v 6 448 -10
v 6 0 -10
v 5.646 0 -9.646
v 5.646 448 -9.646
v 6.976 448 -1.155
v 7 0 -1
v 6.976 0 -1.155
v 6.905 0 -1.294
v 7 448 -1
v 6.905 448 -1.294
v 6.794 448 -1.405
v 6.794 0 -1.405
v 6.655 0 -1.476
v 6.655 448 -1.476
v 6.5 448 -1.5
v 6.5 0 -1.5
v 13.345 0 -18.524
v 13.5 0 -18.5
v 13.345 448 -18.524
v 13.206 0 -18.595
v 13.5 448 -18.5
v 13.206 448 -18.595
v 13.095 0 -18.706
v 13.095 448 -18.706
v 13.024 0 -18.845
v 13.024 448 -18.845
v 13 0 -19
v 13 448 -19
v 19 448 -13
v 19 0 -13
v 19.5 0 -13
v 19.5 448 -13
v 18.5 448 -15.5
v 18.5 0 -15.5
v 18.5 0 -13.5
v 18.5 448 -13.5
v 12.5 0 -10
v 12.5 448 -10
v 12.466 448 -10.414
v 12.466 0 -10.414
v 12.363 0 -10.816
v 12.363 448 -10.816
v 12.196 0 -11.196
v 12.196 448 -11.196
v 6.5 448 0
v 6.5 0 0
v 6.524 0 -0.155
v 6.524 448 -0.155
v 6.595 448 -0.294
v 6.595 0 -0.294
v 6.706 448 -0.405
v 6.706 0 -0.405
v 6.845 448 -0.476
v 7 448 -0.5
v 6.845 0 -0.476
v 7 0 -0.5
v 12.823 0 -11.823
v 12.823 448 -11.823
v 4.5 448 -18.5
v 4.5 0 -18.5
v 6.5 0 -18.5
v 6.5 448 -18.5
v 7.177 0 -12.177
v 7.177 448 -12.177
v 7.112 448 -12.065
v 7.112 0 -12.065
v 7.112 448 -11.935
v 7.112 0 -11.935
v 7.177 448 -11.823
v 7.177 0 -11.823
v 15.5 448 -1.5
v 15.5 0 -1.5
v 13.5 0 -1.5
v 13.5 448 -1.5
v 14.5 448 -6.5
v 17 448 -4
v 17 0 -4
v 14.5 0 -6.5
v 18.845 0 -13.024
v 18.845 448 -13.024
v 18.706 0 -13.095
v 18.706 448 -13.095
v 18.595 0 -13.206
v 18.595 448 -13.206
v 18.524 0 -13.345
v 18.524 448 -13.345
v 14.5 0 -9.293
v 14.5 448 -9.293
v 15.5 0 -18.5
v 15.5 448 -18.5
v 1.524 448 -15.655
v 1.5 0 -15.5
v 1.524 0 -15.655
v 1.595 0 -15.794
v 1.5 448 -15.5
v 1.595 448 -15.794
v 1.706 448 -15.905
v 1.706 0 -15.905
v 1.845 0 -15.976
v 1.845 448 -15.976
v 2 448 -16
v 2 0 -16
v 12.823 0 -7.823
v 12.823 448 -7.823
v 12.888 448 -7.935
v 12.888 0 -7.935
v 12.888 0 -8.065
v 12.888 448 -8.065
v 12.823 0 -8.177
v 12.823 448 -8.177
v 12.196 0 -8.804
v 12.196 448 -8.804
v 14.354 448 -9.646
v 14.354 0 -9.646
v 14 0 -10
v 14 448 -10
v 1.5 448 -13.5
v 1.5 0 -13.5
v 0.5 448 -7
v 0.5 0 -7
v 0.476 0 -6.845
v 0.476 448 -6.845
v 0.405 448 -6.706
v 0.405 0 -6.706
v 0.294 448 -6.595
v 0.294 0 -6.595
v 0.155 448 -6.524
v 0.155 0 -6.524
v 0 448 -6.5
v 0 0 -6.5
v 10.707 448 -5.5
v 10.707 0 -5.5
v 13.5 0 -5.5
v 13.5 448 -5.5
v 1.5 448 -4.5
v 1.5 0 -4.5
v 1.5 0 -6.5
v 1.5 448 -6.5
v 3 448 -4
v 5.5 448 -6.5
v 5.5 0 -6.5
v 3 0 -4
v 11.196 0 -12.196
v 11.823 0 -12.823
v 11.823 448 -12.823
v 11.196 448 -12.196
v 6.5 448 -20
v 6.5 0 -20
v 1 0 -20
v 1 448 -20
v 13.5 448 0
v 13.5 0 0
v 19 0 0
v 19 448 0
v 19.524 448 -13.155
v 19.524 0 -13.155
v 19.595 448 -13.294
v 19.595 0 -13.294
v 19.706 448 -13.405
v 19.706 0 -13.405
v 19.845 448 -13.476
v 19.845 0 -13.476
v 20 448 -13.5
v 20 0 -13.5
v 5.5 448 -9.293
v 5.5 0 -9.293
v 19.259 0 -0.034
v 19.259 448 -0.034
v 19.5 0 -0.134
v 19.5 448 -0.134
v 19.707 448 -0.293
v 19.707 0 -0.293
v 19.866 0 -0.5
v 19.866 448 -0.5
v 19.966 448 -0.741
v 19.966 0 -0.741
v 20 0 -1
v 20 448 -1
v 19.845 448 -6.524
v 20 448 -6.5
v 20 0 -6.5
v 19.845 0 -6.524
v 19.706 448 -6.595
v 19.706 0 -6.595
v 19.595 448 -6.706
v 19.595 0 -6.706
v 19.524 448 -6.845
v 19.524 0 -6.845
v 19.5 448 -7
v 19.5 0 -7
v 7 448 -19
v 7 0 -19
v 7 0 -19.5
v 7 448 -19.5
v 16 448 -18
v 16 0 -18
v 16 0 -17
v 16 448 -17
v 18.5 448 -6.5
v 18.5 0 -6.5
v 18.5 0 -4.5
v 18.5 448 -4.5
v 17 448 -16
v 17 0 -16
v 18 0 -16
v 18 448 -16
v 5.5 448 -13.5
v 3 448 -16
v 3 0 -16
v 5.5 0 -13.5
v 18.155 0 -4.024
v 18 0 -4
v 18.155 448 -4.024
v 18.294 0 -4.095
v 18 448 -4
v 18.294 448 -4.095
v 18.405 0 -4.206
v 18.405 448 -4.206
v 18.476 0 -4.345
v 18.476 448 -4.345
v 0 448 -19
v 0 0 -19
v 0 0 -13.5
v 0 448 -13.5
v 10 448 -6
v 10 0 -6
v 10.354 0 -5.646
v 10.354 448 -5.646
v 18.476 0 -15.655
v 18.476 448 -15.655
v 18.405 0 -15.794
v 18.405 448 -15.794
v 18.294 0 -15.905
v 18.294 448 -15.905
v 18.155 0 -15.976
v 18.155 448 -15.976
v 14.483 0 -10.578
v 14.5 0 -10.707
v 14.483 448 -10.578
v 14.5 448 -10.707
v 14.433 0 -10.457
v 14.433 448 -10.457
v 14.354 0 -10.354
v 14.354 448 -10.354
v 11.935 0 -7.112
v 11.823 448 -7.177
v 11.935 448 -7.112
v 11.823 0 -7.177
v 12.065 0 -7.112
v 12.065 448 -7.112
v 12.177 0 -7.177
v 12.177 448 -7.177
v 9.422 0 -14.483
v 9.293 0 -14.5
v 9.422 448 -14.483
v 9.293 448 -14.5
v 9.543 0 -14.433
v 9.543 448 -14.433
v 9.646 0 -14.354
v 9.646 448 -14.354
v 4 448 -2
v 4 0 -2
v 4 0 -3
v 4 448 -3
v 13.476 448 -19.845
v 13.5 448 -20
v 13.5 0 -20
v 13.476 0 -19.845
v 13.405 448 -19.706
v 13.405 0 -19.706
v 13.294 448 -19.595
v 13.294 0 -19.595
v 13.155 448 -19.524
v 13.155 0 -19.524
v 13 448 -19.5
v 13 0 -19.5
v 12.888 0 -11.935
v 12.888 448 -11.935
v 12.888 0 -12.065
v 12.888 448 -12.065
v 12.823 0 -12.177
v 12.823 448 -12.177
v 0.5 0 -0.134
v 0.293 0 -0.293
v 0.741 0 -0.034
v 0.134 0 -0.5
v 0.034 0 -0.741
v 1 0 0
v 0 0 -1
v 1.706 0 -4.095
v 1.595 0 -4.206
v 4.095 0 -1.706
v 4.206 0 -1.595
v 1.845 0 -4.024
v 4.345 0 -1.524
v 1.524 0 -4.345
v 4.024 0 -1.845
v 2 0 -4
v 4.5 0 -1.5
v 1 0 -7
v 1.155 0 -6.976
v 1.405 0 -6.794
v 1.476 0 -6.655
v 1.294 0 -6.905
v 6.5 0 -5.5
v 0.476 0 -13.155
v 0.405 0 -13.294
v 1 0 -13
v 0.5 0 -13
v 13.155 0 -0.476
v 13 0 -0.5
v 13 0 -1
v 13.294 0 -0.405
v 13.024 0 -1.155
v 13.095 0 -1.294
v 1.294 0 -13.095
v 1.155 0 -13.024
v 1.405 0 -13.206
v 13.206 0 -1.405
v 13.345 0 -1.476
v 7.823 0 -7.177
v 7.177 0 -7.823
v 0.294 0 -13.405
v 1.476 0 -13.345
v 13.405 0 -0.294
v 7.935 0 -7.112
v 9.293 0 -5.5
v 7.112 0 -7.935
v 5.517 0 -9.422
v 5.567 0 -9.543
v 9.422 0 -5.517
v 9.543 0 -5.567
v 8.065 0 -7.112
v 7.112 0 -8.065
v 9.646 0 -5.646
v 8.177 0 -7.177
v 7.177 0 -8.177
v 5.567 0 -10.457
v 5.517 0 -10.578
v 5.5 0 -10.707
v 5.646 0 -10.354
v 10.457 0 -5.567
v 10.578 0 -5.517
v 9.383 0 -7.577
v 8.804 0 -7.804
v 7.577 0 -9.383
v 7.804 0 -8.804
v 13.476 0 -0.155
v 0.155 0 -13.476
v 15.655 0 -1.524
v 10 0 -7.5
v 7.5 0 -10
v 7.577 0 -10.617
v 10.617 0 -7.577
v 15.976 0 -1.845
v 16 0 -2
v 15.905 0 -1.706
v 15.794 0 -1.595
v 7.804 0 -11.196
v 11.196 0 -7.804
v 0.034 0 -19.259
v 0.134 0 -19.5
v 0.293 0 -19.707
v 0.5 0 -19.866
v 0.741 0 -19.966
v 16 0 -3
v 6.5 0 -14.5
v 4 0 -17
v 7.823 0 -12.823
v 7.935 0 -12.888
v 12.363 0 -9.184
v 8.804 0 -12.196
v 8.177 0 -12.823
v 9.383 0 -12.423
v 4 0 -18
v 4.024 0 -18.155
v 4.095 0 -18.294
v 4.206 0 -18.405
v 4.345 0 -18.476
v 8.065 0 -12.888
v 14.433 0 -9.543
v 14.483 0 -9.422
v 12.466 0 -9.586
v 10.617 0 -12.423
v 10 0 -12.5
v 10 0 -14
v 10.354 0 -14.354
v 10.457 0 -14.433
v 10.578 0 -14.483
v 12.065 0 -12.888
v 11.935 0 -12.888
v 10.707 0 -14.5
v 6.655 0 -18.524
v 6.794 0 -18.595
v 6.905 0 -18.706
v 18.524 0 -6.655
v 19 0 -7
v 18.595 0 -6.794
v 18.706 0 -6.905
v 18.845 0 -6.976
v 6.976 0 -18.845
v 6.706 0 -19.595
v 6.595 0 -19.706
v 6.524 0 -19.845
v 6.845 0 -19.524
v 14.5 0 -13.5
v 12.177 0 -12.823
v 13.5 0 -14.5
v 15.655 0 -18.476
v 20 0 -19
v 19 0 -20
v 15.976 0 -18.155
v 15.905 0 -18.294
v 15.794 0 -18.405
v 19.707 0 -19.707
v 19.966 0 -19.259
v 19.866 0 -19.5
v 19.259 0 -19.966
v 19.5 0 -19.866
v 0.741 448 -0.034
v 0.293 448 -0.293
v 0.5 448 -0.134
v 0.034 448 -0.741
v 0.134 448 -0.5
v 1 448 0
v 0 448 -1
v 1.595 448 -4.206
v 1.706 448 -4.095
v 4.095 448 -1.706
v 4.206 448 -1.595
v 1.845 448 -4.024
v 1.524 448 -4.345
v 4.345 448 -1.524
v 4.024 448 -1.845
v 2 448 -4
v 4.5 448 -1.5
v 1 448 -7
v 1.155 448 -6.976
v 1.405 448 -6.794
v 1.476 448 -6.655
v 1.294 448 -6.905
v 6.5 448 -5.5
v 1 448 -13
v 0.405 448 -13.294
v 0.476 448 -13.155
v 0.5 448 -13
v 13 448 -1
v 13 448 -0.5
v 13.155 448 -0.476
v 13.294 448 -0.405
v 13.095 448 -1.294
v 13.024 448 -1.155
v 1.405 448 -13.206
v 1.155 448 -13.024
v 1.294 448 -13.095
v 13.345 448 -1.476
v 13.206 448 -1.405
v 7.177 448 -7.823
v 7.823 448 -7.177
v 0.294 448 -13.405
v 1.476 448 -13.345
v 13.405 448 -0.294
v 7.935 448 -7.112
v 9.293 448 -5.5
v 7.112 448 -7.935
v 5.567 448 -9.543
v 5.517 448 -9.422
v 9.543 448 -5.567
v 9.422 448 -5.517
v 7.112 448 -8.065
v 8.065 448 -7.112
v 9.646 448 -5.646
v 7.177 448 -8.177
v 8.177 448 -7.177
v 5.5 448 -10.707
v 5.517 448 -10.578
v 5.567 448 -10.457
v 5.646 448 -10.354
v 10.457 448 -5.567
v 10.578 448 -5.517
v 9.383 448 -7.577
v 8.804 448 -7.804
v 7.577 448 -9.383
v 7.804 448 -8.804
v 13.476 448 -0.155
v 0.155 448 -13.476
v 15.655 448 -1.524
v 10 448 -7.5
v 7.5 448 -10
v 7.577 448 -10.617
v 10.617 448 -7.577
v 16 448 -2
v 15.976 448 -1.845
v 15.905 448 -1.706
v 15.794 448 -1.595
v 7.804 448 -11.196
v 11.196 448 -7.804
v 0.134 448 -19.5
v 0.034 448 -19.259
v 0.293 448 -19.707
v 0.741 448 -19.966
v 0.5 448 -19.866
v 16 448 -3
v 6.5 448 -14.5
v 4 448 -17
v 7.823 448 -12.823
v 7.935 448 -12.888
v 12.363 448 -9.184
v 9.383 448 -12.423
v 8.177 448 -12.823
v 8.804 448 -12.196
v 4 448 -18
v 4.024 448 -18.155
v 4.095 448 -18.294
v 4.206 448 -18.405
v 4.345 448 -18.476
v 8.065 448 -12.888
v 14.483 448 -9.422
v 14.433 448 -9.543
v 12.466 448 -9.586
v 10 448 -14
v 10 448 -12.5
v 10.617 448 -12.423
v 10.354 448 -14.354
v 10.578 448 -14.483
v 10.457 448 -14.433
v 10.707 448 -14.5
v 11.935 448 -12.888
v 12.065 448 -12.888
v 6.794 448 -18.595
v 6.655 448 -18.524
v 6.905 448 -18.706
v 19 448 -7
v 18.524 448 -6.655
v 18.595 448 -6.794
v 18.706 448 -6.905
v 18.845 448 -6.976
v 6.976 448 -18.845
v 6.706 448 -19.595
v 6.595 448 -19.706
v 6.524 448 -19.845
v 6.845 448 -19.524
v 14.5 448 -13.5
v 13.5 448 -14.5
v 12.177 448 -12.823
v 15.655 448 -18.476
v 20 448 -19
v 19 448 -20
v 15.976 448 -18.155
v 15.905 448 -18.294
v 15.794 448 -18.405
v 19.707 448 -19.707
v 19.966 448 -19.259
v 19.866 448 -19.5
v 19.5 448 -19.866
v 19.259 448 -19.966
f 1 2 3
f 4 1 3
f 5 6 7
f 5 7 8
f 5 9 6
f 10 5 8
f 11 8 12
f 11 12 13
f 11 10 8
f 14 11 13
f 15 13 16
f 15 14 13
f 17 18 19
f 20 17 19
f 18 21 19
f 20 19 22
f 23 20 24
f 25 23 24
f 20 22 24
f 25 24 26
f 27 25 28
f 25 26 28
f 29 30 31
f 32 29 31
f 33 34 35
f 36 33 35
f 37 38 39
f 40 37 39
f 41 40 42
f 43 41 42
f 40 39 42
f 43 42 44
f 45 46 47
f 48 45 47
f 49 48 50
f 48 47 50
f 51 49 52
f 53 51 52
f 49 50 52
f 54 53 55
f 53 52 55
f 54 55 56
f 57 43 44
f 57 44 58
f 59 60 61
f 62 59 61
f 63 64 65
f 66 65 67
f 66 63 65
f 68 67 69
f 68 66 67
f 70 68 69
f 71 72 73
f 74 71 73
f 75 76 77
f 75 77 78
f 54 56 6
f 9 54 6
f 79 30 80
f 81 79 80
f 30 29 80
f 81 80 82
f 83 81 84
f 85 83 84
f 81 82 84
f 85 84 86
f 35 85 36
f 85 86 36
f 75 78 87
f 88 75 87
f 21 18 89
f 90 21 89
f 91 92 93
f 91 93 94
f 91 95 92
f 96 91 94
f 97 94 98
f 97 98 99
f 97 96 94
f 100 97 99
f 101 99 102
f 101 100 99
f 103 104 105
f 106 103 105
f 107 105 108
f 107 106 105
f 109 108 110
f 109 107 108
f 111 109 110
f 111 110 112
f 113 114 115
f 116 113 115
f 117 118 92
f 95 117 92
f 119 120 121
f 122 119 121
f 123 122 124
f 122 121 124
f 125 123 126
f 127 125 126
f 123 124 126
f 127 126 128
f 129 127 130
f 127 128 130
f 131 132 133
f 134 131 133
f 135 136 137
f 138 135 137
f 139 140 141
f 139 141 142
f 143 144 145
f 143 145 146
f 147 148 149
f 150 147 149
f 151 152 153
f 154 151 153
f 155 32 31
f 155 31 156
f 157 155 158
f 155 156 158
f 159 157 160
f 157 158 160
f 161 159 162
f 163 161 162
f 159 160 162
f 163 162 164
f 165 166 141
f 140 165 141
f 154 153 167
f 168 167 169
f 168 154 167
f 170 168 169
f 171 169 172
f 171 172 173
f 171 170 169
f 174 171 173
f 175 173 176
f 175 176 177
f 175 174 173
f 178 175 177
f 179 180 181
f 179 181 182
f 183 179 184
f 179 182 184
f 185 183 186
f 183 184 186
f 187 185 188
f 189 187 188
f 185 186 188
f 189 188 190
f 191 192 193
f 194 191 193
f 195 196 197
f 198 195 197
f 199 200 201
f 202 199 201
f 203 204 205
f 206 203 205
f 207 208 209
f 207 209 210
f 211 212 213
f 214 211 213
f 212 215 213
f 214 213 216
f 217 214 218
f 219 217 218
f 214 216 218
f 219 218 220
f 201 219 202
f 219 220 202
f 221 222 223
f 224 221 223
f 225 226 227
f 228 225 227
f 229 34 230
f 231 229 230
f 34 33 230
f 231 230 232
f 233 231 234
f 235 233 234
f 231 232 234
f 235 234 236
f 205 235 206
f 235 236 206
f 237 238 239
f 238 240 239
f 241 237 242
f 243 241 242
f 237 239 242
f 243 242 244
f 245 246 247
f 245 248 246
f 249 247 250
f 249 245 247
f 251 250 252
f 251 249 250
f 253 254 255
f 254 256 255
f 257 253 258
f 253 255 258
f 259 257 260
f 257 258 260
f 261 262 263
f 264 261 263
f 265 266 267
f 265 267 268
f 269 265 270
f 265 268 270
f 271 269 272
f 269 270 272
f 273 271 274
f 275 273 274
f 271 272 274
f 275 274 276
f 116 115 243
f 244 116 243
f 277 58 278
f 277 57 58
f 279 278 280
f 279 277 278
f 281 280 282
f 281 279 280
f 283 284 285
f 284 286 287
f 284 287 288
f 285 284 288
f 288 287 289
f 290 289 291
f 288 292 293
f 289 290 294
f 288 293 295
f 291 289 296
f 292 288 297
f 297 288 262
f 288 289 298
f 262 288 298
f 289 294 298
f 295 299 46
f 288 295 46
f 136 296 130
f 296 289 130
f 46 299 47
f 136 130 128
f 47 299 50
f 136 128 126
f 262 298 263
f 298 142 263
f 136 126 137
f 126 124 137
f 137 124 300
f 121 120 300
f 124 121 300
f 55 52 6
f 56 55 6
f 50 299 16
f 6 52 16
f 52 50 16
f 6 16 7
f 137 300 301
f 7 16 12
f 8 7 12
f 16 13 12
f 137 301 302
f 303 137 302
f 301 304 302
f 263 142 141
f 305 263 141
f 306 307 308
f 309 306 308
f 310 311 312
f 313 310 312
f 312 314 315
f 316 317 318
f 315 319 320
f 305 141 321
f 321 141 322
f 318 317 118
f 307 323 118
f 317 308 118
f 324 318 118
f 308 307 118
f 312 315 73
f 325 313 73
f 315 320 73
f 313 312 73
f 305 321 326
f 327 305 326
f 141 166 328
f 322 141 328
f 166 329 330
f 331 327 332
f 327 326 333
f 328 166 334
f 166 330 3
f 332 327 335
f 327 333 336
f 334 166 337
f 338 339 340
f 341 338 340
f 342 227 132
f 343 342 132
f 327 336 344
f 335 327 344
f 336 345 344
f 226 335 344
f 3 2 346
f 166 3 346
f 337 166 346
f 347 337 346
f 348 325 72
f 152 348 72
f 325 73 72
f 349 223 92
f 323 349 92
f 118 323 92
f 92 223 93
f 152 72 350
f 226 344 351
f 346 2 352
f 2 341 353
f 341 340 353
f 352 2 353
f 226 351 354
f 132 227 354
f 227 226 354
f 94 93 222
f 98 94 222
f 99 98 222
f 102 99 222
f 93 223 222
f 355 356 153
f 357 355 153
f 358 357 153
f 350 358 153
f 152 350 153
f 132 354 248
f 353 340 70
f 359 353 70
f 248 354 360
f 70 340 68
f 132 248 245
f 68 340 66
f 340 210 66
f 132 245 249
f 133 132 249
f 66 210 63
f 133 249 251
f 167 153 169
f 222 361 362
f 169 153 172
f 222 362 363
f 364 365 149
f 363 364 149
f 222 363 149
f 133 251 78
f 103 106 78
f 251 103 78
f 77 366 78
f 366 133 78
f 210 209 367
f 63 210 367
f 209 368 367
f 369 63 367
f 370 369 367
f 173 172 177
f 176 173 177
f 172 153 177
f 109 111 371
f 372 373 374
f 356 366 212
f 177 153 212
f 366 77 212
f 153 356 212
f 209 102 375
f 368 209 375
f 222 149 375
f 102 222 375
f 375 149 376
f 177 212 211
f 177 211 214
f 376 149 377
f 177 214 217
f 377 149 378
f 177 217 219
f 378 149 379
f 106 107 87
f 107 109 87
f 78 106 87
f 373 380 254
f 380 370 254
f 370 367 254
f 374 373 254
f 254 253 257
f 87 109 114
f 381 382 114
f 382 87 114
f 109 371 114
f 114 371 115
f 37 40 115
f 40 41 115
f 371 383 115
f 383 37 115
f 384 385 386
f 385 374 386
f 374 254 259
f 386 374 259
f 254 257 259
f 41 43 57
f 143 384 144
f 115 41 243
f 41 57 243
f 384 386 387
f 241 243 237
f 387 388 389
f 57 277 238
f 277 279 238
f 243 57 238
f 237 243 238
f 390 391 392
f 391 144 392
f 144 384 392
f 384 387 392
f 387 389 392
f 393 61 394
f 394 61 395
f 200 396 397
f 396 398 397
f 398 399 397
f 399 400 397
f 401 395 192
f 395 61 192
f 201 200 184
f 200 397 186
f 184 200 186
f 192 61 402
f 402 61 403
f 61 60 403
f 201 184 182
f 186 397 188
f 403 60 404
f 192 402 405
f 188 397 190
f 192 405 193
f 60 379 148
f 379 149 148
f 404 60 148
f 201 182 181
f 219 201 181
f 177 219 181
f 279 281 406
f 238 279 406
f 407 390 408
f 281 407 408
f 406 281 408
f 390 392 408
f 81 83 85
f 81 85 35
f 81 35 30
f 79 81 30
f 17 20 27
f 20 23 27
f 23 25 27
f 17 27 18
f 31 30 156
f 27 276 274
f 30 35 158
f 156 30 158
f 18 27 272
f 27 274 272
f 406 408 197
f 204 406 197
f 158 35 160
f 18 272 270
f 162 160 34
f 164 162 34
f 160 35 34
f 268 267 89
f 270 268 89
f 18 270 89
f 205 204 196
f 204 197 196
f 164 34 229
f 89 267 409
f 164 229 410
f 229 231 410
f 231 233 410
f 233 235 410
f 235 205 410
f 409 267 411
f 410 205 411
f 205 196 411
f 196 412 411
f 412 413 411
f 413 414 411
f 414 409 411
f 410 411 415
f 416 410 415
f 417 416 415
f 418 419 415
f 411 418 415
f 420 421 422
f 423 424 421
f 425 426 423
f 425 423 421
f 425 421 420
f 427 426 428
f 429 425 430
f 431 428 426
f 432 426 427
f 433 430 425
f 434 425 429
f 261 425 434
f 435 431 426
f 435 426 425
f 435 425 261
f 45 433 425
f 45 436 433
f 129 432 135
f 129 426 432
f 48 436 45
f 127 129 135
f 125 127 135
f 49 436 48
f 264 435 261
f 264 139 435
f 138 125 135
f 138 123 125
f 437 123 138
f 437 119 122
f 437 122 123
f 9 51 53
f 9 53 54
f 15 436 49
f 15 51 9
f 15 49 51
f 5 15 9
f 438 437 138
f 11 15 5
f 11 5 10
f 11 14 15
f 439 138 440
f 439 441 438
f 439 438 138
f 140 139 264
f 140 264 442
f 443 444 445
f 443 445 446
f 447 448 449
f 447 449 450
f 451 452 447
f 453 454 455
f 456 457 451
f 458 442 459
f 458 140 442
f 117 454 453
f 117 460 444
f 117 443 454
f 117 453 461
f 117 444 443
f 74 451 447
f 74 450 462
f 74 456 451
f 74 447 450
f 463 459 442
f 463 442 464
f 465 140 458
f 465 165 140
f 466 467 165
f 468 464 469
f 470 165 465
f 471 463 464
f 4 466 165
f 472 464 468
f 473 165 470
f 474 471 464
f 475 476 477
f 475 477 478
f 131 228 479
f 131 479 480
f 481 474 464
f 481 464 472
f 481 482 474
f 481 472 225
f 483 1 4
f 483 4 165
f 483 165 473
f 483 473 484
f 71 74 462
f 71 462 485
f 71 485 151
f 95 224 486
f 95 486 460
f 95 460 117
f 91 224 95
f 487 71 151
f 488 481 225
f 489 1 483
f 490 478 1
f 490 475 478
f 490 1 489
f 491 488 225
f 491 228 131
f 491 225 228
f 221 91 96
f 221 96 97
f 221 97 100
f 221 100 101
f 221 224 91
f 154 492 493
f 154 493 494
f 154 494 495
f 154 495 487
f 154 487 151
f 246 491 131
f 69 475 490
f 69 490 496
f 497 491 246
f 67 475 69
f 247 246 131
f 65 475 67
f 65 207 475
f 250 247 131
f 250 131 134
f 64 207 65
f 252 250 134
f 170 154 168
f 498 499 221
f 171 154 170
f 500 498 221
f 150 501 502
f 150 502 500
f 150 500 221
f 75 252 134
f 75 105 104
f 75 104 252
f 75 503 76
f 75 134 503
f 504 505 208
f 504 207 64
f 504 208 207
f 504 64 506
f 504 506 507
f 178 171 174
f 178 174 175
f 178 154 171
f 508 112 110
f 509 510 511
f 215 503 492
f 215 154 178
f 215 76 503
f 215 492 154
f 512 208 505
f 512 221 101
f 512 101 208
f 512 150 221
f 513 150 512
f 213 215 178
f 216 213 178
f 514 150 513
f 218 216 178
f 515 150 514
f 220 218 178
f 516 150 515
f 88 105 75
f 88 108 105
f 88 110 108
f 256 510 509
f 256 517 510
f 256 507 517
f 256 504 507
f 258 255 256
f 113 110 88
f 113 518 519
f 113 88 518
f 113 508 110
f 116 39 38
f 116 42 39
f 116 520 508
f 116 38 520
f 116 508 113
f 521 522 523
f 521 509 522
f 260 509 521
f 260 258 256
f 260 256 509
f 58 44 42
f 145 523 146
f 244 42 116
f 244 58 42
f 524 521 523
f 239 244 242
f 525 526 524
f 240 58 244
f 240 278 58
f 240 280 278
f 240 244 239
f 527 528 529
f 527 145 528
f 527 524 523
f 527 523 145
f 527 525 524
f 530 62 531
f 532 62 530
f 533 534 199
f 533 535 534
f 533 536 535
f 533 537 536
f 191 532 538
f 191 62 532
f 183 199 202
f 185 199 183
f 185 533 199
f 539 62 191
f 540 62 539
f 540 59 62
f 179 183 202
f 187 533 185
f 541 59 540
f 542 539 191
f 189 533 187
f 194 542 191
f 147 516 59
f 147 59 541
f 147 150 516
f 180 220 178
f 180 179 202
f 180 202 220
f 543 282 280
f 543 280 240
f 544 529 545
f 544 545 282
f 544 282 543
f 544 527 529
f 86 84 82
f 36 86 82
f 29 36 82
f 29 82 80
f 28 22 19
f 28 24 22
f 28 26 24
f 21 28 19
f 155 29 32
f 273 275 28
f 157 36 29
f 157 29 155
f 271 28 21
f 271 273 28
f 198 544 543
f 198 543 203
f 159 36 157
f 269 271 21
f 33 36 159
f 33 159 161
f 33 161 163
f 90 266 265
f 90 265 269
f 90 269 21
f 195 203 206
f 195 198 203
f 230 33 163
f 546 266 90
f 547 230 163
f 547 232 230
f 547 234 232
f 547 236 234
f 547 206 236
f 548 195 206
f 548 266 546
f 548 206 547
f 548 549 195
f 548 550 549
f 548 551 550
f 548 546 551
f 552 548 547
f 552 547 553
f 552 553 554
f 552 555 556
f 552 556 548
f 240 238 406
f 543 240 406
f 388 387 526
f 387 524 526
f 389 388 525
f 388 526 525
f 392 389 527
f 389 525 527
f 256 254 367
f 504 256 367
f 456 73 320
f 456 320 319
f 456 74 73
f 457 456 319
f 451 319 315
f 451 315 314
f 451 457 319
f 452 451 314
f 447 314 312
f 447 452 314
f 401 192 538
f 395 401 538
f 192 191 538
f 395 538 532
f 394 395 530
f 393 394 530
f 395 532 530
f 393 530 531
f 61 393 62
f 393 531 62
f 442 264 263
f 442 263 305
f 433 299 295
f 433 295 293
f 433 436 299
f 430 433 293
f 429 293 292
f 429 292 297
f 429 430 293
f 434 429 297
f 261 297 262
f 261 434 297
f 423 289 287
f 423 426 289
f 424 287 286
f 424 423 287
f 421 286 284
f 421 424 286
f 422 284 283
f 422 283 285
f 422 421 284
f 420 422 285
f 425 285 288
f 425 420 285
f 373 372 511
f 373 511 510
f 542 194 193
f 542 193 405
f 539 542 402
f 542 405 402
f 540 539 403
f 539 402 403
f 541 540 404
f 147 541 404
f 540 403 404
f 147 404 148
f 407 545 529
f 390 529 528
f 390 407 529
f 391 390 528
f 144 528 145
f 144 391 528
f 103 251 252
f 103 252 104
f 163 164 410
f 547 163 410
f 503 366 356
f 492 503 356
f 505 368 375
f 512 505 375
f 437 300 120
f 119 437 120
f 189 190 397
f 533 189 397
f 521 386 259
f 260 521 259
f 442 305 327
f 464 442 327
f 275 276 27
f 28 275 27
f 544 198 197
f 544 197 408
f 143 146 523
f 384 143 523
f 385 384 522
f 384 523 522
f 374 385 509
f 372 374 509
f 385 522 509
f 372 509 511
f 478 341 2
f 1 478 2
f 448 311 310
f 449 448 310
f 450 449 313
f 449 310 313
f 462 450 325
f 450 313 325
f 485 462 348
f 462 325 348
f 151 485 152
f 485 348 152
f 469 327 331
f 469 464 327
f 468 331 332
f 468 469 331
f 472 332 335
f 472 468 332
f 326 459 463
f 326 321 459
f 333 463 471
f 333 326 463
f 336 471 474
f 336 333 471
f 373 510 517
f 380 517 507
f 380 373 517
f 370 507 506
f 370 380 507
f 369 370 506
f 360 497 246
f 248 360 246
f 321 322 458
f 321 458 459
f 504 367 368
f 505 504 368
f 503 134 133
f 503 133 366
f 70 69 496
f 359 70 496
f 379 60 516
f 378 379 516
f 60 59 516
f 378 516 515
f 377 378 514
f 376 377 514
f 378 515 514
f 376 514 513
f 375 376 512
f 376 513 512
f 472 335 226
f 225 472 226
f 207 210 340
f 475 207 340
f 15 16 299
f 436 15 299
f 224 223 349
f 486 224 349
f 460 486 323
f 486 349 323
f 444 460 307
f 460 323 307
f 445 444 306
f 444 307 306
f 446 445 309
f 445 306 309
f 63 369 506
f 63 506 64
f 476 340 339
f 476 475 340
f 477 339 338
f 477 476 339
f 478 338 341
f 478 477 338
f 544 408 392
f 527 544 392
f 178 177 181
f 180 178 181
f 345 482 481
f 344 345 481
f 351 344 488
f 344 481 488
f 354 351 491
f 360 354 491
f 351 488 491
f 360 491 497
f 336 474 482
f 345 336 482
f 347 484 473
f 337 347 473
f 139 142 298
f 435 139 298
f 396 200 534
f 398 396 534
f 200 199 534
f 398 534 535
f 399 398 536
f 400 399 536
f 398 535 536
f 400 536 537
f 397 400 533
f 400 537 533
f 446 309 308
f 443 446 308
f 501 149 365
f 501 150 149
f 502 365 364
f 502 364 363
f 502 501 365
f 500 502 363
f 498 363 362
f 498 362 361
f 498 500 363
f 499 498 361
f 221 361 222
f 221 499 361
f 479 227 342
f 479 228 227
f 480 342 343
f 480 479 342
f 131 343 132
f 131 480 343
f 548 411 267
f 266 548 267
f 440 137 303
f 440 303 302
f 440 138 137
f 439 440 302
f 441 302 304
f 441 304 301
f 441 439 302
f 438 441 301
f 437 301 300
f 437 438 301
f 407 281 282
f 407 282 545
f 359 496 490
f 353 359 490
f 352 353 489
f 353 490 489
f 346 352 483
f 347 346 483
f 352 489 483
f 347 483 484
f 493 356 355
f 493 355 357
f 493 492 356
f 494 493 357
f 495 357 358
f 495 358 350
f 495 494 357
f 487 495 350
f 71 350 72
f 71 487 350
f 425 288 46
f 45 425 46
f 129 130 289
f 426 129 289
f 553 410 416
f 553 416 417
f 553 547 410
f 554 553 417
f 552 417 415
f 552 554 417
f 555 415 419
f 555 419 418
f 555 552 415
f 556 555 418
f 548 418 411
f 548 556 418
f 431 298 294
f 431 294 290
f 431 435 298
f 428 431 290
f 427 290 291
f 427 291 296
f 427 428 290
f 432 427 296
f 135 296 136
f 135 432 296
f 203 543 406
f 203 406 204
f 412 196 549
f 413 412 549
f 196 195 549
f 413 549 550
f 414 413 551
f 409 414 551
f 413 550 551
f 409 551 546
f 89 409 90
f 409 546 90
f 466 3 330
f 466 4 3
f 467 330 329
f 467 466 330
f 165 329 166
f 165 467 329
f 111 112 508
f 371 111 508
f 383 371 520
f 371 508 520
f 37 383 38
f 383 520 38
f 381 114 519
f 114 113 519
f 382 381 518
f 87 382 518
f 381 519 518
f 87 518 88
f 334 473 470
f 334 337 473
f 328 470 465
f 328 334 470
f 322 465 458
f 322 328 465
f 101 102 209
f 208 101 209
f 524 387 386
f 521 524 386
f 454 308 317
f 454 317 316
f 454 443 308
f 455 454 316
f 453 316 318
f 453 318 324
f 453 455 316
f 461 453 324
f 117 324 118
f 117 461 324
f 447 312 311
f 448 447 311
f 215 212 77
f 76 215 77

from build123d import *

# Parameters (mm, degrees)
BOSS_EXTRUDE1_DEPTH = 448
FILLET1_R           = 1
CUT_EXTRUDE1_DEPTH  = 449
FILLET2_R           = 0.5
FILLET3_R           = 0.25


with BuildPart() as part:
    # Sketch3 → Boss-Extrude1 (new body)
    with BuildSketch(Plane(origin=(0, 0, 0), x_dir=(1, 0, 0), z_dir=(0, 1, 0))):
        with BuildLine():
            Line((7, 18.5), (7, 19.5))
            ThreePointArc((7, 19.5), (6.646446609, 19.646446609), (6.5, 20))
            Line((6.5, 20), (0, 20))
            Line((0, 20), (0, 13.5))
            ThreePointArc((0, 13.5), (0.353553391, 13.353553391), (0.5, 13))
            Line((0.5, 13), (1.5, 13))
            Line((1.5, 13), (1.5, 16))
            Line((1.5, 16), (3, 16))
            Line((3, 16), (5.5, 13.5))
            Line((5.5, 13.5), (5.5, 10.5))
            Line((5.5, 10.5), (6, 10))
            Line((6, 10), (5.5, 9.5))
            Line((5.5, 9.5), (5.5, 6.5))
            Line((5.5, 6.5), (3, 4))
            Line((3, 4), (1.5, 4))
            Line((1.5, 4), (1.5, 7))
            Line((1.5, 7), (0.5, 7))
            ThreePointArc((0.5, 7), (0.353553391, 6.646446609), (0, 6.5))
            Line((0, 6.5), (0, 0))
            Line((0, 0), (6.5, 0))
            ThreePointArc((6.5, 0), (6.646446609, 0.353553391), (7, 0.5))
            Line((7, 0.5), (7, 1.5))
            Line((7, 1.5), (4, 1.5))
            Line((4, 1.5), (4, 3))
            Line((4, 3), (6.5, 5.5))
            Line((6.5, 5.5), (9.5, 5.5))
            Line((9.5, 5.5), (10, 6))
            Line((10, 6), (10.5, 5.5))
            Line((10.5, 5.5), (13.5, 5.5))
            Line((13.5, 5.5), (16, 3))
            Line((16, 3), (16, 1.5))
            Line((16, 1.5), (13, 1.5))
            Line((13, 1.5), (13, 0.5))
            ThreePointArc((13, 0.5), (13.353553391, 0.353553391), (13.5, 0))
            Line((13.5, 0), (20, 0))
            Line((20, 0), (20, 6.5))
            ThreePointArc((20, 6.5), (19.646446609, 6.646446609), (19.5, 7))
            Line((19.5, 7), (18.5, 7))
            Line((18.5, 7), (18.5, 4))
            Line((18.5, 4), (17, 4))
            Line((17, 4), (14.5, 6.5))
            Line((14.5, 6.5), (14.5, 9.5))
            Line((14.5, 9.5), (14, 10))
            Line((14, 10), (14.5, 10.5))
            Line((14.5, 10.5), (14.5, 13.5))
            Line((14.5, 13.5), (17, 16))
            Line((17, 16), (18.5, 16))
            Line((18.5, 16), (18.5, 13))
            Line((18.5, 13), (19.5, 13))
            ThreePointArc((19.5, 13), (19.646446609, 13.353553391), (20, 13.5))
            Line((20, 13.5), (20, 20))
            Line((20, 20), (13.5, 20))
            ThreePointArc((13.5, 20), (13.353553391, 19.646446609), (13, 19.5))
            Line((13, 19.5), (13, 18.5))
            Line((13, 18.5), (16, 18.5))
            Line((16, 18.5), (16, 17))
            Line((16, 17), (13.5, 14.5))
            Line((13.5, 14.5), (10.5, 14.5))
            Line((10.5, 14.5), (10, 14))
            Line((10, 14), (9.5, 14.5))
            Line((9.5, 14.5), (6.5, 14.5))
            Line((6.5, 14.5), (4, 17))
            Line((4, 17), (4, 18.5))
            Line((4, 18.5), (7, 18.5))
        make_face()
    extrude(amount=BOSS_EXTRUDE1_DEPTH)

    # Fillet1
    fillet1_edges = [part.edges().sort_by_distance(p)[0] for p in [
        (20, 224, 0),
        (0, 224, 0),
        (0, 224, -20),
        (20, 224, -20),
    ]]
    fillet(fillet1_edges, radius=FILLET1_R)

    # Sketch4 → Cut-Extrude1 (cut, through all)
    with BuildSketch(Plane(origin=(0, 448, 0), x_dir=(1, 0, 0), z_dir=(0, 1, 0))):
        with BuildLine():
            Line((10, 11), (11.195582496, 12.195582496))
            ThreePointArc((11.195582496, 12.195582496), (10, 12.5), (8.804417504, 12.195582496))
            Line((8.804417504, 12.195582496), (10, 11))
        make_face()
        with BuildLine():
            ThreePointArc((12.195582496, 11.195582496), (11.767766953, 11.767766953), (11.195582496, 12.195582496))
            Line((11.195582496, 12.195582496), (10, 11))
            Line((10, 11), (11, 10))
            Line((11, 10), (12.195582496, 11.195582496))
        make_face()
        with BuildLine():
            Line((9, 10), (10, 11))
            Line((10, 11), (8.804417504, 12.195582496))
            ThreePointArc((8.804417504, 12.195582496), (8.232233047, 11.767766953), (7.804417504, 11.195582496))
            Line((7.804417504, 11.195582496), (9, 10))
        make_face()
        Polygon((11, 10), (10, 11), (9, 10), (10, 9), align=None)
        with BuildLine():
            Line((7.804417504, 8.804417504), (9, 10))
            Line((9, 10), (7.804417504, 11.195582496))
            ThreePointArc((7.804417504, 11.195582496), (7.5, 10), (7.804417504, 8.804417504))
        make_face()
        with BuildLine():
            Line((10, 9), (9, 10))
            Line((9, 10), (7.804417504, 8.804417504))
            ThreePointArc((7.804417504, 8.804417504), (8.232233047, 8.232233047), (8.804417504, 7.804417504))
            Line((8.804417504, 7.804417504), (10, 9))
        make_face()
        with BuildLine():
            Line((11.195582496, 7.804417504), (10, 9))
            Line((10, 9), (8.804417504, 7.804417504))
            ThreePointArc((8.804417504, 7.804417504), (10, 7.5), (11.195582496, 7.804417504))
        make_face()
        with BuildLine():
            Line((12.195582496, 8.804417504), (11, 10))
            Line((11, 10), (10, 9))
            Line((10, 9), (11.195582496, 7.804417504))
            ThreePointArc((11.195582496, 7.804417504), (11.767766953, 8.232233047), (12.195582496, 8.804417504))
        make_face()
        with BuildLine():
            ThreePointArc((12.5, 10), (12.422700584, 10.616864556), (12.195582496, 11.195582496))
            Line((12.195582496, 11.195582496), (11, 10))
            Line((11, 10), (12.195582496, 8.804417504))
            ThreePointArc((12.195582496, 8.804417504), (12.422700584, 9.383135444), (12.5, 10))
        make_face()
        with BuildLine():
            ThreePointArc((8.804417504, 7.804417504), (8.232233047, 8.232233047), (7.804417504, 8.804417504))
            Line((7.804417504, 8.804417504), (7, 8))
            Line((7, 8), (8, 7))
            Line((8, 7), (8.804417504, 7.804417504))
        make_face()
        with BuildLine():
            Line((13, 8), (12.195582496, 8.804417504))
            ThreePointArc((12.195582496, 8.804417504), (11.767766953, 8.232233047), (11.195582496, 7.804417504))
            Line((11.195582496, 7.804417504), (12, 7))
            Line((12, 7), (13, 8))
        make_face()
        with BuildLine():
            Line((13, 12), (12, 13))
            Line((12, 13), (11.195582496, 12.195582496))
            ThreePointArc((11.195582496, 12.195582496), (11.767766953, 11.767766953), (12.195582496, 11.195582496))
            Line((12.195582496, 11.195582496), (13, 12))
        make_face()
        with BuildLine():
            ThreePointArc((7.804417504, 11.195582496), (8.232233047, 11.767766953), (8.804417504, 12.195582496))
            Line((8.804417504, 12.195582496), (8, 13))
            Line((8, 13), (7, 12))
            Line((7, 12), (7.804417504, 11.195582496))
        make_face()
    extrude(amount=-CUT_EXTRUDE1_DEPTH, mode=Mode.SUBTRACT)

    # Fillet2
    fillet2_edges = [part.edges().sort_by_distance(p)[0] for p in [
        (18.5, 224, -13),
        (18.5, 224, -16),
        (14.5, 224, -10.5),
        (14.5, 224, -9.5),
        (18.5, 224, -4),
        (18.5, 224, -7),
        (13, 224, -1.5),
        (16, 224, -1.5),
        (10.5, 224, -5.5),
        (9.5, 224, -5.5),
        (4, 224, -1.5),
        (7, 224, -1.5),
        (1.5, 224, -7),
        (1.5, 224, -4),
        (5.5, 224, -9.5),
        (5.5, 224, -10.5),
        (1.5, 224, -16),
        (1.5, 224, -13),
        (7, 224, -18.5),
        (4, 224, -18.5),
        (9.5, 224, -14.5),
        (10.5, 224, -14.5),
        (16, 224, -18.5),
        (13, 224, -18.5),
    ]]
    fillet(fillet2_edges, radius=FILLET2_R)

    # Fillet3
    fillet3_edges = [part.edges().sort_by_distance(p)[0] for p in [
        (7, 224, -12),
        (8, 224, -13),
        (12, 224, -13),
        (13, 224, -12),
        (13, 224, -8),
        (12, 224, -7),
        (8, 224, -7),
        (7, 224, -8),
    ]]
    fillet(fillet3_edges, radius=FILLET3_R)


solid = part.part
